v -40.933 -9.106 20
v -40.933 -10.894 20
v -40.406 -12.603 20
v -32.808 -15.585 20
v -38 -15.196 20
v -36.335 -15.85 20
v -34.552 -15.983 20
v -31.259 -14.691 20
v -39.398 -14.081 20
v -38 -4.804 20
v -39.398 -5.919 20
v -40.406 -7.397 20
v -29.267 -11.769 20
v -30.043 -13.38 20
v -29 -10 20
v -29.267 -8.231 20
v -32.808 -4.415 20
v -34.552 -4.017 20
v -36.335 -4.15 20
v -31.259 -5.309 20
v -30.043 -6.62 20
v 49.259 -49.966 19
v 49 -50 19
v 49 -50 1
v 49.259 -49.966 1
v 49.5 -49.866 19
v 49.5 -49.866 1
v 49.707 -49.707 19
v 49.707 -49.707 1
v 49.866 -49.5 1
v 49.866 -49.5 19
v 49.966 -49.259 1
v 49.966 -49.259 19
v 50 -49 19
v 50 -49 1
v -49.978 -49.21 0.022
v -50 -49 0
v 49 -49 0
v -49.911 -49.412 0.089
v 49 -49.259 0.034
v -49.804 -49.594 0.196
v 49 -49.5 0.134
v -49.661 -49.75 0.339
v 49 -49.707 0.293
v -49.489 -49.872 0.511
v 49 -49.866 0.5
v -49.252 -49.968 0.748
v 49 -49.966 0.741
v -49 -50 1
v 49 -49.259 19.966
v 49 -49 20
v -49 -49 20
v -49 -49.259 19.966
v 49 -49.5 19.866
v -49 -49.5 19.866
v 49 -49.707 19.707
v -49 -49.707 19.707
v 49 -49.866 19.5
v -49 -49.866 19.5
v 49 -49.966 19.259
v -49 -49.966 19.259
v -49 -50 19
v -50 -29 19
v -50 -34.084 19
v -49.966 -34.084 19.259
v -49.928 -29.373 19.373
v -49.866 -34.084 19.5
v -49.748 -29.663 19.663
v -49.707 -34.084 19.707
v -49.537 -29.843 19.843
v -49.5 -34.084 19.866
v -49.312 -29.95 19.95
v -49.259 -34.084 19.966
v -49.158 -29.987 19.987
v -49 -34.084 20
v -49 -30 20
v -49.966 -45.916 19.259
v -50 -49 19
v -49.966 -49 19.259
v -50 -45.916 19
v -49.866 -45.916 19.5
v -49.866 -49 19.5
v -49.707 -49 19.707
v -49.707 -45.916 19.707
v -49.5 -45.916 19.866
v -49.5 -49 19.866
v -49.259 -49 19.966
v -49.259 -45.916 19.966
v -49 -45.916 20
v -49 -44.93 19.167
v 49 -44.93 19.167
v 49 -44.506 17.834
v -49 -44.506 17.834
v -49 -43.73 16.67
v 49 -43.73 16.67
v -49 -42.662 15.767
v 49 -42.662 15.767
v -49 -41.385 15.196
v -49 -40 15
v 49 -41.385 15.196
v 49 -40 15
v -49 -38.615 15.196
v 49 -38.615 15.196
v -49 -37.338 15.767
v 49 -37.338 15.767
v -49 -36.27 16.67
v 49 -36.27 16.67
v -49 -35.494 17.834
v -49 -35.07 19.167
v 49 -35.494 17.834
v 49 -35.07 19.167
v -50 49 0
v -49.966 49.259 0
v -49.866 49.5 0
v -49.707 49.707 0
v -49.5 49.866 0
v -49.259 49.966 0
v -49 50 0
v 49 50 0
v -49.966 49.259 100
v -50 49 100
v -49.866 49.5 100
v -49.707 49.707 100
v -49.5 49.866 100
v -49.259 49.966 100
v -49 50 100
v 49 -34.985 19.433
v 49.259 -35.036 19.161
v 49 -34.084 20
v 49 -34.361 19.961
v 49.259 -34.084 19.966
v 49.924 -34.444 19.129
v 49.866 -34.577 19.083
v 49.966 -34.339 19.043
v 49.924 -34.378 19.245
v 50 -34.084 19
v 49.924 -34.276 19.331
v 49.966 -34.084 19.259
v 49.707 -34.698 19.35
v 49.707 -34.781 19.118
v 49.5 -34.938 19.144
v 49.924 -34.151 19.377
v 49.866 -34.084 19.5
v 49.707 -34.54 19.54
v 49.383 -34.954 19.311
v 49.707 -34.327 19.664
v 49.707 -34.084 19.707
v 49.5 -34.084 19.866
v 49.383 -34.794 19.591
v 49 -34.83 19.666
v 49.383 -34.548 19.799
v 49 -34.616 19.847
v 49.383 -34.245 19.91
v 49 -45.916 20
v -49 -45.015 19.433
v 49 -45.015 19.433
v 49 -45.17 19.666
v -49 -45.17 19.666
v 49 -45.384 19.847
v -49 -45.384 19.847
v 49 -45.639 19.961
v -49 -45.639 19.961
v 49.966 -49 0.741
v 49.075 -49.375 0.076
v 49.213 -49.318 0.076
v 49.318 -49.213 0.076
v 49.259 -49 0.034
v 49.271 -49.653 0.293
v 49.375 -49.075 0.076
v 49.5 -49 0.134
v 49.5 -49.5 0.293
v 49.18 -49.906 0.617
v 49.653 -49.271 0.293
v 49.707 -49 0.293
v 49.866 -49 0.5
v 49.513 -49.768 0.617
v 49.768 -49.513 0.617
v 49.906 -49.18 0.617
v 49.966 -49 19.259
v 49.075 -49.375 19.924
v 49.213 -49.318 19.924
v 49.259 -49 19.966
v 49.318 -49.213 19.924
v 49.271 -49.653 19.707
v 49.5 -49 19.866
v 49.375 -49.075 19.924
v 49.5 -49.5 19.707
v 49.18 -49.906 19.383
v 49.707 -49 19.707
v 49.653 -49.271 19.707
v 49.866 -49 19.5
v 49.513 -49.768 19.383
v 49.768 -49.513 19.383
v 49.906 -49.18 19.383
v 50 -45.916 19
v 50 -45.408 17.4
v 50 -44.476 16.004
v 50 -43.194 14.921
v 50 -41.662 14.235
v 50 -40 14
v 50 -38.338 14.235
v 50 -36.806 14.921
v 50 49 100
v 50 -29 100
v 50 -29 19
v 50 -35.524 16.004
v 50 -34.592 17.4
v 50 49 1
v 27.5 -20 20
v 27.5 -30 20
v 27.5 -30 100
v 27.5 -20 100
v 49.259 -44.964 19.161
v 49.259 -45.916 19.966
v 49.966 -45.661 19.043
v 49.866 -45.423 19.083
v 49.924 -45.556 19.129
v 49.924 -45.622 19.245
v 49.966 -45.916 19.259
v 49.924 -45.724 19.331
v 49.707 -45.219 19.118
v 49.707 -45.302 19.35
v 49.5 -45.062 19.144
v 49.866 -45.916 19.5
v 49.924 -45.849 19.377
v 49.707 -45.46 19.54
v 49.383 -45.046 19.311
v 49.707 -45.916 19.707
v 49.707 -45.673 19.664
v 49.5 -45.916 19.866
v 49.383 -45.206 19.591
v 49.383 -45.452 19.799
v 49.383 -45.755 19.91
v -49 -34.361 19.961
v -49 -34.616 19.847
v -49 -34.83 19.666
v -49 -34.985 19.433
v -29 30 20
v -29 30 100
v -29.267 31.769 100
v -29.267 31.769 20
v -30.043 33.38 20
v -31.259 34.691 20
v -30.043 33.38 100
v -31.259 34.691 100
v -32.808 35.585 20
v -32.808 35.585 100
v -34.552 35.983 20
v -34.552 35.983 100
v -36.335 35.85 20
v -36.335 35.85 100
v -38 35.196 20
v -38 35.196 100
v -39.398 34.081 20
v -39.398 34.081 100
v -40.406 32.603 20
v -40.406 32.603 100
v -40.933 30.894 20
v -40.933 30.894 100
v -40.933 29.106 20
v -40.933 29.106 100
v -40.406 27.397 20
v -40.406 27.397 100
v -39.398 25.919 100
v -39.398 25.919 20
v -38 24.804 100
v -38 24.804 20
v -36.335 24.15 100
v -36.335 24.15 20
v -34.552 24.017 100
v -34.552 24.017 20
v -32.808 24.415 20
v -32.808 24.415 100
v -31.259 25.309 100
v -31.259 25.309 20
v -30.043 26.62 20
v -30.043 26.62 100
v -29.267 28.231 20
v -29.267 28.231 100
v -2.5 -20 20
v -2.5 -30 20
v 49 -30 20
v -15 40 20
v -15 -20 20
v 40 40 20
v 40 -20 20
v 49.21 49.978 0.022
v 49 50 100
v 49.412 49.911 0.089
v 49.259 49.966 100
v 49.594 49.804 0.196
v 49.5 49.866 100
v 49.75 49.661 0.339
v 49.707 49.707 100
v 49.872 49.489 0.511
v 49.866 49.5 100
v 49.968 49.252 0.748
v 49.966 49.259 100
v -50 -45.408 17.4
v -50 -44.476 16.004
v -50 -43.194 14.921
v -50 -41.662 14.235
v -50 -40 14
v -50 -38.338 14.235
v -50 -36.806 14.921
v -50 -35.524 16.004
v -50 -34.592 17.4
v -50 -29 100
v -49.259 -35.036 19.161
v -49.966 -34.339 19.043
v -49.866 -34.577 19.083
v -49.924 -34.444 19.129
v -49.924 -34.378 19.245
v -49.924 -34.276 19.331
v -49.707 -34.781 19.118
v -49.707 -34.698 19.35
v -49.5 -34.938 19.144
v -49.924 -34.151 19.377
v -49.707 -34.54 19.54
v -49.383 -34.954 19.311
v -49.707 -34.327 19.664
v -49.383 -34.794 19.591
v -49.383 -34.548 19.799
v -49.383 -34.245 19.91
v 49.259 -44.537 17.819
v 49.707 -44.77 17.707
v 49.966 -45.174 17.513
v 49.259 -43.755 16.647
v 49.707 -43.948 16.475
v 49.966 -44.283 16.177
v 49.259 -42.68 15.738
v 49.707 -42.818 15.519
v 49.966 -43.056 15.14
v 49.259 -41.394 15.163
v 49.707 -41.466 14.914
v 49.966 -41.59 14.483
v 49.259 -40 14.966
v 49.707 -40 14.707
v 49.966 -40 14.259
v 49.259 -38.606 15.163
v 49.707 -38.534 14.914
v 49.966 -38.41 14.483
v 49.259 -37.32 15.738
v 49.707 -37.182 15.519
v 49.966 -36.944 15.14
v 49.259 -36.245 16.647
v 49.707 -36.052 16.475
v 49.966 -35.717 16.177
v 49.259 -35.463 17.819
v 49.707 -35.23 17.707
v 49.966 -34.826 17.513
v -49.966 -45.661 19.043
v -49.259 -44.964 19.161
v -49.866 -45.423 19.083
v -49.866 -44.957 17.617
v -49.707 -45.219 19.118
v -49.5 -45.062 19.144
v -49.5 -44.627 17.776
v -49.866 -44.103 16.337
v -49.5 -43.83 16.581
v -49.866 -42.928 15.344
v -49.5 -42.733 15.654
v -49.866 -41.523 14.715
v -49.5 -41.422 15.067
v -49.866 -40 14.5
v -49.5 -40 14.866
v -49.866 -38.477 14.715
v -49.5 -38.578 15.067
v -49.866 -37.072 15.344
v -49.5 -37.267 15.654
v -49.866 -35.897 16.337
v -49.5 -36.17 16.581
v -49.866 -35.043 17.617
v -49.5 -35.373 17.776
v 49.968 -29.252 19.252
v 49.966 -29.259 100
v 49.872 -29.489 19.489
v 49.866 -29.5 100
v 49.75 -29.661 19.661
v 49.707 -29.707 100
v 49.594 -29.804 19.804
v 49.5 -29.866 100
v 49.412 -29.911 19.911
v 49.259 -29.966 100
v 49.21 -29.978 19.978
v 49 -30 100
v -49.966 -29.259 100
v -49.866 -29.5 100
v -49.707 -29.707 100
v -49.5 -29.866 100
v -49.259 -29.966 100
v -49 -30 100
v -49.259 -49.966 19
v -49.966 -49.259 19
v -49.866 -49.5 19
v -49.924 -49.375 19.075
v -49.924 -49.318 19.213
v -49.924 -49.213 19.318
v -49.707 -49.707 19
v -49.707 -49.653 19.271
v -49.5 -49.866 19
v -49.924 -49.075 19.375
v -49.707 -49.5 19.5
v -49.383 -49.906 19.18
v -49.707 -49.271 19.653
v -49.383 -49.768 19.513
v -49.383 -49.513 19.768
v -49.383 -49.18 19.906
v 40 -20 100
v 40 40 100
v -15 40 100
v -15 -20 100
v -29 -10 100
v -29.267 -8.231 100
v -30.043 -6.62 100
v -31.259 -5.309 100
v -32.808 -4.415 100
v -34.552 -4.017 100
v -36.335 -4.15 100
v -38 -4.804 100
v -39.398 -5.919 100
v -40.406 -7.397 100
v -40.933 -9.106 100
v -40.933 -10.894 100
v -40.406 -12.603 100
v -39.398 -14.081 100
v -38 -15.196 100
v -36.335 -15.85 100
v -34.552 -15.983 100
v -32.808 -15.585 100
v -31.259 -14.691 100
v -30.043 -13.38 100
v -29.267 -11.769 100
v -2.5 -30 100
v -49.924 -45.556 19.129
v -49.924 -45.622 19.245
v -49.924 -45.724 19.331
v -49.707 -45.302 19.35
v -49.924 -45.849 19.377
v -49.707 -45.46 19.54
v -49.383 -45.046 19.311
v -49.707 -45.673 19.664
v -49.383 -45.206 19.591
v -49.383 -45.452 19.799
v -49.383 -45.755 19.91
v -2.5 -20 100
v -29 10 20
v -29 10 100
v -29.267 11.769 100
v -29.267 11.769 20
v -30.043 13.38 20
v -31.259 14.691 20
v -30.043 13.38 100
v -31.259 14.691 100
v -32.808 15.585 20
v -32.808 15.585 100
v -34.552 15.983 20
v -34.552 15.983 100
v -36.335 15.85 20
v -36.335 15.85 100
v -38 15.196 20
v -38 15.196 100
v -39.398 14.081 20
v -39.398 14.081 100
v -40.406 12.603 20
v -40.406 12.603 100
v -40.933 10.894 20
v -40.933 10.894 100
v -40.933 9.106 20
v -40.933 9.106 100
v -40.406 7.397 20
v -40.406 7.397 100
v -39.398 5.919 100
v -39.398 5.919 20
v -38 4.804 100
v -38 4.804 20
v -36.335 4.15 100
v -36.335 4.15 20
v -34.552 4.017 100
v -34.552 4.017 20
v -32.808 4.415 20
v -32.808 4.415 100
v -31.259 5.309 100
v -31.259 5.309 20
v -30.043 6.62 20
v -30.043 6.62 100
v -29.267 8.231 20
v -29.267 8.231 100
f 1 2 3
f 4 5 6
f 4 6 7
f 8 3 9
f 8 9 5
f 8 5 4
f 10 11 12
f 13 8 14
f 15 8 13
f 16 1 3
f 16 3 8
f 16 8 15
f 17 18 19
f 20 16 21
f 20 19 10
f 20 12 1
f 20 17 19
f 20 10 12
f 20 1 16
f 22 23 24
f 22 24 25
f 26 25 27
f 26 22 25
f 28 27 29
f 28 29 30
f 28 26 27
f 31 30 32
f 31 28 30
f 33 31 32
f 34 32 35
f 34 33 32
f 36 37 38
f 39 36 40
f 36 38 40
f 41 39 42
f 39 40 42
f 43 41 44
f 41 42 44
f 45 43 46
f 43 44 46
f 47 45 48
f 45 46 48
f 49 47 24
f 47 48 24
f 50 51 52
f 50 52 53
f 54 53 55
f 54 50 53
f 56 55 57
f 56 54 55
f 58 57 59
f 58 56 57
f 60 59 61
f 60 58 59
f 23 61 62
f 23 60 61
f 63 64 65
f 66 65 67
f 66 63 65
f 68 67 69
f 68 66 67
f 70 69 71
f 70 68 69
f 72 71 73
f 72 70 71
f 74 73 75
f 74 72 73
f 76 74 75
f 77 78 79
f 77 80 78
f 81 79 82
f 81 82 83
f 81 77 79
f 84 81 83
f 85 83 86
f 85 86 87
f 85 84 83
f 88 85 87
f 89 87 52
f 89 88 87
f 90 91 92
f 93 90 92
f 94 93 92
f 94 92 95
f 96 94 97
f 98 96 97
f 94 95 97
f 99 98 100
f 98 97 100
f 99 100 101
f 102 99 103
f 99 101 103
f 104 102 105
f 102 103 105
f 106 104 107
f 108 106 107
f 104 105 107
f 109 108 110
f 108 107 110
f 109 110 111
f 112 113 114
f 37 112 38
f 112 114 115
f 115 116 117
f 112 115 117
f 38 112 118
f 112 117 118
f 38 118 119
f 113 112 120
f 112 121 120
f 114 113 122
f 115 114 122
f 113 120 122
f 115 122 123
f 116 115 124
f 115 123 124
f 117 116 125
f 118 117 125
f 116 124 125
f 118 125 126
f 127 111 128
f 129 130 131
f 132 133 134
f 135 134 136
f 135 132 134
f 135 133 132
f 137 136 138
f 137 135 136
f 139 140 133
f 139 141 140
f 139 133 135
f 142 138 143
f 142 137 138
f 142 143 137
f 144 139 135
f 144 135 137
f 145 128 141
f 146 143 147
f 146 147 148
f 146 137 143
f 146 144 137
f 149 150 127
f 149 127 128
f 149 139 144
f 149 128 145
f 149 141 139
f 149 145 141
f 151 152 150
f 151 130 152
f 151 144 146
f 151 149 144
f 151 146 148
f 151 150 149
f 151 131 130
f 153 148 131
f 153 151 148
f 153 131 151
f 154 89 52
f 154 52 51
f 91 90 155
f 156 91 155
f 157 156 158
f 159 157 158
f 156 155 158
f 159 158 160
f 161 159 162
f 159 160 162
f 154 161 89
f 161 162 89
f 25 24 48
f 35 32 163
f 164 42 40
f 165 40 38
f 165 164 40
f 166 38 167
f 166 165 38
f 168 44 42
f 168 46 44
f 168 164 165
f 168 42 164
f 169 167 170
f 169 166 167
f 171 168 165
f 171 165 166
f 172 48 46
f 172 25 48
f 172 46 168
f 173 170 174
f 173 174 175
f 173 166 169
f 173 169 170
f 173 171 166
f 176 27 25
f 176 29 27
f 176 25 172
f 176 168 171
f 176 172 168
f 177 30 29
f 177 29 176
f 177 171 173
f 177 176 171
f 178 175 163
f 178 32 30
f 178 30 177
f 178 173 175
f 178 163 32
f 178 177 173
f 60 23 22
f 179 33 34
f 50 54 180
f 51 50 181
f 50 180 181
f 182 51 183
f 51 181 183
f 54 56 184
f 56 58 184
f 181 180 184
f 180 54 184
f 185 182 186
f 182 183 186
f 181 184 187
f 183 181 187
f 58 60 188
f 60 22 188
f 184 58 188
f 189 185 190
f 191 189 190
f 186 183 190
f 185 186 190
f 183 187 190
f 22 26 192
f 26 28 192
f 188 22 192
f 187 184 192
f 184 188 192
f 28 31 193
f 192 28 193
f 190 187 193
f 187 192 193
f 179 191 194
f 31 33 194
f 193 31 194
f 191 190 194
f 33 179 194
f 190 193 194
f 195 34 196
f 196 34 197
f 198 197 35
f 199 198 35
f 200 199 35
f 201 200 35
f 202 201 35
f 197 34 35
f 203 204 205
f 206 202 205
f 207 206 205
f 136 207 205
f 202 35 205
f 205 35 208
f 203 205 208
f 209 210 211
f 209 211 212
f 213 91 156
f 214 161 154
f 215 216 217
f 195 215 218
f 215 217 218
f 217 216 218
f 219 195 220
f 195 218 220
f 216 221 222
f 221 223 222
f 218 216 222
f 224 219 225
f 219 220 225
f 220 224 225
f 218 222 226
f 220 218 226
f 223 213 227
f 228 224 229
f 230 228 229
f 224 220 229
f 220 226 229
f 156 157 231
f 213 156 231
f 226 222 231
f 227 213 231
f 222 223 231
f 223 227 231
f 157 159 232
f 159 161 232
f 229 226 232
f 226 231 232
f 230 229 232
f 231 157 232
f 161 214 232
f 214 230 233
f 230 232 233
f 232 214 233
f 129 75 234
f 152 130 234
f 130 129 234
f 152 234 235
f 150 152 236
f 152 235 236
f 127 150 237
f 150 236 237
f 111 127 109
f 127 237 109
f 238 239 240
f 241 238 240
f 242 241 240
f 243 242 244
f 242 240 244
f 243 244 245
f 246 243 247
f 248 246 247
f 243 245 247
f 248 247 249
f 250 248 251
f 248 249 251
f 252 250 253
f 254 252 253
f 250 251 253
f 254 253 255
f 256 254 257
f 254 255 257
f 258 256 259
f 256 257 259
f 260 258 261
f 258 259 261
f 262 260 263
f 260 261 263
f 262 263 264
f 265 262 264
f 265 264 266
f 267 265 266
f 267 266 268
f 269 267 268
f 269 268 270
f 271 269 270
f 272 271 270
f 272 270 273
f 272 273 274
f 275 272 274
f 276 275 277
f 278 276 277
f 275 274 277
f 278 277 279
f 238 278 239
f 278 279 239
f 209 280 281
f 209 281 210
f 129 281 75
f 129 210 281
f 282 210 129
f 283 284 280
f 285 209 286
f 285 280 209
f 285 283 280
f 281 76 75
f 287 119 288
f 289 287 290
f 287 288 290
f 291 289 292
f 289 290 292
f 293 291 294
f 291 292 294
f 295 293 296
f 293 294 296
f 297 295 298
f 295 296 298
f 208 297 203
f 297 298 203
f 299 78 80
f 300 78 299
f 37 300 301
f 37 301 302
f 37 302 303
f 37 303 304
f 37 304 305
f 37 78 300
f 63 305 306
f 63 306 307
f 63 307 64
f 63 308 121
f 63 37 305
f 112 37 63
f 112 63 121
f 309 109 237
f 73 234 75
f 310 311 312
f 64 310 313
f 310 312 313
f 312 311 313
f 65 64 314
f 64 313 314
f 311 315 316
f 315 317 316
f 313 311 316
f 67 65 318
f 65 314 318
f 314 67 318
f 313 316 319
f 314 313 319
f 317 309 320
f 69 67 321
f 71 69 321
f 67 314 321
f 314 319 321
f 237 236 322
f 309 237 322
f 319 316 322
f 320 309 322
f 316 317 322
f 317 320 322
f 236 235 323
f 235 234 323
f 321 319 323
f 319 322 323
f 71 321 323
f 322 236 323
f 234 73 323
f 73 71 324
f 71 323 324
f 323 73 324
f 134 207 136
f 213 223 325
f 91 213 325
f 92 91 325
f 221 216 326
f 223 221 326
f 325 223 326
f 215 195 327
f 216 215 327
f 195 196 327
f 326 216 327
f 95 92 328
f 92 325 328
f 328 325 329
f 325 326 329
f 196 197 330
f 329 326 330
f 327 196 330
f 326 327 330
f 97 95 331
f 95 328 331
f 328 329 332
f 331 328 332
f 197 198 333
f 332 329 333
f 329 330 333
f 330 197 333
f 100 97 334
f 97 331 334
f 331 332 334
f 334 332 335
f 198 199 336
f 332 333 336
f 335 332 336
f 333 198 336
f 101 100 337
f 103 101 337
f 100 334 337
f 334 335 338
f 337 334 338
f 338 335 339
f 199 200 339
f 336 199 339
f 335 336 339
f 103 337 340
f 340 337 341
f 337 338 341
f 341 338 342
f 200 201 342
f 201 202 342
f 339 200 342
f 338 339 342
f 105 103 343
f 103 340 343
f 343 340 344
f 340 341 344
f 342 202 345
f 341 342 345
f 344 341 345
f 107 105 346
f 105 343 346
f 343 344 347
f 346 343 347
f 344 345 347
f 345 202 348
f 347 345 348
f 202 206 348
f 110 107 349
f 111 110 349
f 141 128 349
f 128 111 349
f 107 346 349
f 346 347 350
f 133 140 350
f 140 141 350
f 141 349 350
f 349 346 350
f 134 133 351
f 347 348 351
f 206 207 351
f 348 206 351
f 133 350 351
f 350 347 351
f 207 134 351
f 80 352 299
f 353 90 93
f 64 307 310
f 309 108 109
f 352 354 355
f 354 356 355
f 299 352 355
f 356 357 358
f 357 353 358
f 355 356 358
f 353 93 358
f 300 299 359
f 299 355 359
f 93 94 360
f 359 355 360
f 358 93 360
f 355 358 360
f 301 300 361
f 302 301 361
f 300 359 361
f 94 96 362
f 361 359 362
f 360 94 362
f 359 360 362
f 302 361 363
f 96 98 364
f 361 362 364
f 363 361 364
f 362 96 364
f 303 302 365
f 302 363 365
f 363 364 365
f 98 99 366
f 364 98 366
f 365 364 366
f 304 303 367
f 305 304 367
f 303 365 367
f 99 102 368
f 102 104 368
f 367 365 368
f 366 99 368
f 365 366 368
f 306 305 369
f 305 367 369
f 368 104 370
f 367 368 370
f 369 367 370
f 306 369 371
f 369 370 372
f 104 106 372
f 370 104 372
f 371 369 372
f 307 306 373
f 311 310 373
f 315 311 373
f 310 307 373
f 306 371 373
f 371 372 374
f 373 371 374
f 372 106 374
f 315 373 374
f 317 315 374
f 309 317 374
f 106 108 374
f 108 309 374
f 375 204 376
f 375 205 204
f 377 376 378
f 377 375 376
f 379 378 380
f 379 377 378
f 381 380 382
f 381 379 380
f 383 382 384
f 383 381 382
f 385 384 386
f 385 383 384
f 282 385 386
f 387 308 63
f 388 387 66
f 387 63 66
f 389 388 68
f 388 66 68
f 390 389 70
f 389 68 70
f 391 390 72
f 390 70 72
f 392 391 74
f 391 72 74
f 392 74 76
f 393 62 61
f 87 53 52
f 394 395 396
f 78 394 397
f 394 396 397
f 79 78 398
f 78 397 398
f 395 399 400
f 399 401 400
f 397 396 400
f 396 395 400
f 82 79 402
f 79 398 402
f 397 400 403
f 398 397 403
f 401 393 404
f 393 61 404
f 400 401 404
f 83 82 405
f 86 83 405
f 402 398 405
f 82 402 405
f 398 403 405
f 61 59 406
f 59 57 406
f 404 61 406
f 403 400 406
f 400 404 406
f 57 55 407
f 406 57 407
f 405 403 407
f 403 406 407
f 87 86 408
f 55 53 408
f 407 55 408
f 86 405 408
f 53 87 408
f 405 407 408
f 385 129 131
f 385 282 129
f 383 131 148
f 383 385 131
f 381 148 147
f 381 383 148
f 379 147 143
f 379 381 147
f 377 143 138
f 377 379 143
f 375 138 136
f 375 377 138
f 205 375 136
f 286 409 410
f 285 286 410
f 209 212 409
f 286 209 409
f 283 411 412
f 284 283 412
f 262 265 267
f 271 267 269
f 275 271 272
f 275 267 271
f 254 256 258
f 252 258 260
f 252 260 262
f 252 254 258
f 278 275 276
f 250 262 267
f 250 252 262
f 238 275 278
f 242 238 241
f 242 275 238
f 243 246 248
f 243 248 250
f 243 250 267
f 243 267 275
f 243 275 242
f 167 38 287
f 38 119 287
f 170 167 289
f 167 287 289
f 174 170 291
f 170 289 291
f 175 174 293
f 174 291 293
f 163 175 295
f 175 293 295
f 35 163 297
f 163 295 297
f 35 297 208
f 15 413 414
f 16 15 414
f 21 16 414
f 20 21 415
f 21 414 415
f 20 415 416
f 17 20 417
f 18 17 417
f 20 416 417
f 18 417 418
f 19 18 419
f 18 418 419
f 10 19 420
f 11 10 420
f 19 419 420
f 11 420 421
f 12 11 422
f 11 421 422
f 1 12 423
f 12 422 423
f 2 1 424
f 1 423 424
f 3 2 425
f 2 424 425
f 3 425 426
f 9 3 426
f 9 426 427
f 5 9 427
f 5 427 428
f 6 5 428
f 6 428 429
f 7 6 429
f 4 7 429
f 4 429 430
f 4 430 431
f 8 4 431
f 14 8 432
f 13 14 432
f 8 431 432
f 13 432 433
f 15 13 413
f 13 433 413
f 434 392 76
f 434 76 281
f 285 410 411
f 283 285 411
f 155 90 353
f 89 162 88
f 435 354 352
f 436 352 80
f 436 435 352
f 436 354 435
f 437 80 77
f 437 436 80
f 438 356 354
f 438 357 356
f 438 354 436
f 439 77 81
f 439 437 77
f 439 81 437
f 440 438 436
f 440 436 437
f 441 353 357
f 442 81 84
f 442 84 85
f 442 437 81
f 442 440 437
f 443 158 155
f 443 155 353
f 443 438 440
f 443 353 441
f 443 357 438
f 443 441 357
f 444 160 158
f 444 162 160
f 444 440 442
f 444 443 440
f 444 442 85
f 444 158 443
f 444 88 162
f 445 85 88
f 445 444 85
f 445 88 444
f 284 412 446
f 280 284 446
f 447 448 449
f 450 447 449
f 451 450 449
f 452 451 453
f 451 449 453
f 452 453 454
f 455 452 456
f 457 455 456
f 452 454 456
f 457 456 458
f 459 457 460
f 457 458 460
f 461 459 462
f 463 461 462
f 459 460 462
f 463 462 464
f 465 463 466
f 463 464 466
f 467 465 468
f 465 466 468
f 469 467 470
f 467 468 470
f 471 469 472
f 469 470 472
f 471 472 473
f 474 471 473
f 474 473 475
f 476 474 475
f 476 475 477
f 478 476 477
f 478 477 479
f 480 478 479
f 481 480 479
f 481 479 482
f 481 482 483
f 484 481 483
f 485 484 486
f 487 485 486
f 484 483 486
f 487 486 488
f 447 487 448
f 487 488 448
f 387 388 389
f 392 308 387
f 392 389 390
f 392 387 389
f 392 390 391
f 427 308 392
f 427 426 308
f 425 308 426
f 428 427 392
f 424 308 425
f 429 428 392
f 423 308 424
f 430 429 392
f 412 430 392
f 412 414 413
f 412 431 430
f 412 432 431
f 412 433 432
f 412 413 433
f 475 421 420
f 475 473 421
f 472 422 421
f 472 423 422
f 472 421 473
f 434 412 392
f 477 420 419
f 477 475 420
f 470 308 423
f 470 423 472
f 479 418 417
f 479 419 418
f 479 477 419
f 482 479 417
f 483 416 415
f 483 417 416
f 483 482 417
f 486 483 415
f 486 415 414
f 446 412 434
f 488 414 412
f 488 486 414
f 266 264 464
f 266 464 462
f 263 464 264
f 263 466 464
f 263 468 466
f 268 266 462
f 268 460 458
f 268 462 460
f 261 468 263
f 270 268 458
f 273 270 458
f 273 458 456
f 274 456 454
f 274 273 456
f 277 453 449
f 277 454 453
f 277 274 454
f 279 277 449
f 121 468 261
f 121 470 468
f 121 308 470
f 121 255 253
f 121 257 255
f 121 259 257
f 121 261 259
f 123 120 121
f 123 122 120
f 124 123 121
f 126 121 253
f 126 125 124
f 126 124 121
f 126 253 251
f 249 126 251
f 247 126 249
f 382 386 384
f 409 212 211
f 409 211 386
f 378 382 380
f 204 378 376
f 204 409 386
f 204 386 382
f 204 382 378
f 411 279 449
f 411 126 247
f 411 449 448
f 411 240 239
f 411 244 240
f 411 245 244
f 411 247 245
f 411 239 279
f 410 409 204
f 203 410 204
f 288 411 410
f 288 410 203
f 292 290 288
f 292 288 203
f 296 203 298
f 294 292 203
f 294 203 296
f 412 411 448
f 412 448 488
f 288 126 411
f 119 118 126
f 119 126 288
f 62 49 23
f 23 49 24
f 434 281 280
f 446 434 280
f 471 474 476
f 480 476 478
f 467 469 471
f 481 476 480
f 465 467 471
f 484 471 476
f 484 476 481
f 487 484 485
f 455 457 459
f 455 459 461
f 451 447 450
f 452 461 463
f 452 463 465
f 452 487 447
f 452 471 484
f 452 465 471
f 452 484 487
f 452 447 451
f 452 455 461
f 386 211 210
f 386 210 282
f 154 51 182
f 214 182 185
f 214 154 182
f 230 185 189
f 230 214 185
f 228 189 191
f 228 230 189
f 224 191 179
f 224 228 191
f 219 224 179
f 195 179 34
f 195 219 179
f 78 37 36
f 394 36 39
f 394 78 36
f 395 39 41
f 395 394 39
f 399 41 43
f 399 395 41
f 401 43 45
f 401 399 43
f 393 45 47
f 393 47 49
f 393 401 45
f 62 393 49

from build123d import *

# Parameters (mm, degrees)
F0_W     = 100
F0_H     = 100
F1_DEPTH = 100
F2_W     = 100
F2_H     = 20
F3_DEPTH = 80
F4_W     = 30
F4_H     = 10
F5_DEPTH = 80
F6_R     = 6
F7_DEPTH = 80
F9_DEPTH = 100
F10_R    = 1


with BuildPart() as f1:
    # F0 (on Top) → F1 (new body)
    with BuildSketch(Plane.XY):
        Rectangle(F0_W, F0_H)
    extrude(amount=F1_DEPTH)

    # F2 (on face) → F3 (cut)
    with BuildSketch(Plane.XY.offset(100)):
        with Locations((0, -40)):
            Rectangle(F2_W, F2_H)
    extrude(amount=-F3_DEPTH, mode=Mode.SUBTRACT)

    # F4 (on face) → F5 (cut, through all)
    with BuildSketch(Plane.XY.offset(100)):
        Polygon((40, 40), (-15, 40), (-15, -20), (-2.5, -20), (27.5, -20), (40, -20), align=None)
        with Locations((12.5, -25)):
            Rectangle(F4_W, F4_H)
    extrude(amount=-F5_DEPTH, mode=Mode.SUBTRACT)

    # F6 (on face) → F7 (cut, through all)
    with BuildSketch(Plane.XY.offset(100)):
        with Locations((-35, -10)):
            Circle(F6_R)
        with Locations((-35, 10)):
            Circle(F6_R)
        with Locations((-35, 30)):
            Circle(F6_R)
    extrude(amount=-F7_DEPTH, mode=Mode.SUBTRACT)

    # F8 (on face) → F9 (cut, through all)
    with BuildSketch(Plane.YZ.offset(50)):
        with BuildLine():
            ThreePointArc((-45, 20), (-40, 15), (-35, 20))
            Line((-35, 20), (-45, 20))
        make_face()
    extrude(amount=-F9_DEPTH, mode=Mode.SUBTRACT)

    # F10
    f10_edges = [f1.edges().sort_by_distance(p)[0] for p in [
        (0, -35, 20),
        (0, -45, 20),
        (50, -50, 10),
        (0, -50, 20),
        (-50, -50, 10),
        (0, -50, 0),
        (50, 0, 0),
        (50, -40, 15),
        (50, -47.5, 20),
        (50, -32.5, 20),
        (50, -30, 60),
        (-50, -40, 15),
        (-50, -47.5, 20),
        (-50, -32.5, 20),
        (50, 50, 50),
        (-50, -30, 60),
        (-50, 50, 50),
    ]]
    fillet(f10_edges, radius=F10_R)


solid = f1.part
